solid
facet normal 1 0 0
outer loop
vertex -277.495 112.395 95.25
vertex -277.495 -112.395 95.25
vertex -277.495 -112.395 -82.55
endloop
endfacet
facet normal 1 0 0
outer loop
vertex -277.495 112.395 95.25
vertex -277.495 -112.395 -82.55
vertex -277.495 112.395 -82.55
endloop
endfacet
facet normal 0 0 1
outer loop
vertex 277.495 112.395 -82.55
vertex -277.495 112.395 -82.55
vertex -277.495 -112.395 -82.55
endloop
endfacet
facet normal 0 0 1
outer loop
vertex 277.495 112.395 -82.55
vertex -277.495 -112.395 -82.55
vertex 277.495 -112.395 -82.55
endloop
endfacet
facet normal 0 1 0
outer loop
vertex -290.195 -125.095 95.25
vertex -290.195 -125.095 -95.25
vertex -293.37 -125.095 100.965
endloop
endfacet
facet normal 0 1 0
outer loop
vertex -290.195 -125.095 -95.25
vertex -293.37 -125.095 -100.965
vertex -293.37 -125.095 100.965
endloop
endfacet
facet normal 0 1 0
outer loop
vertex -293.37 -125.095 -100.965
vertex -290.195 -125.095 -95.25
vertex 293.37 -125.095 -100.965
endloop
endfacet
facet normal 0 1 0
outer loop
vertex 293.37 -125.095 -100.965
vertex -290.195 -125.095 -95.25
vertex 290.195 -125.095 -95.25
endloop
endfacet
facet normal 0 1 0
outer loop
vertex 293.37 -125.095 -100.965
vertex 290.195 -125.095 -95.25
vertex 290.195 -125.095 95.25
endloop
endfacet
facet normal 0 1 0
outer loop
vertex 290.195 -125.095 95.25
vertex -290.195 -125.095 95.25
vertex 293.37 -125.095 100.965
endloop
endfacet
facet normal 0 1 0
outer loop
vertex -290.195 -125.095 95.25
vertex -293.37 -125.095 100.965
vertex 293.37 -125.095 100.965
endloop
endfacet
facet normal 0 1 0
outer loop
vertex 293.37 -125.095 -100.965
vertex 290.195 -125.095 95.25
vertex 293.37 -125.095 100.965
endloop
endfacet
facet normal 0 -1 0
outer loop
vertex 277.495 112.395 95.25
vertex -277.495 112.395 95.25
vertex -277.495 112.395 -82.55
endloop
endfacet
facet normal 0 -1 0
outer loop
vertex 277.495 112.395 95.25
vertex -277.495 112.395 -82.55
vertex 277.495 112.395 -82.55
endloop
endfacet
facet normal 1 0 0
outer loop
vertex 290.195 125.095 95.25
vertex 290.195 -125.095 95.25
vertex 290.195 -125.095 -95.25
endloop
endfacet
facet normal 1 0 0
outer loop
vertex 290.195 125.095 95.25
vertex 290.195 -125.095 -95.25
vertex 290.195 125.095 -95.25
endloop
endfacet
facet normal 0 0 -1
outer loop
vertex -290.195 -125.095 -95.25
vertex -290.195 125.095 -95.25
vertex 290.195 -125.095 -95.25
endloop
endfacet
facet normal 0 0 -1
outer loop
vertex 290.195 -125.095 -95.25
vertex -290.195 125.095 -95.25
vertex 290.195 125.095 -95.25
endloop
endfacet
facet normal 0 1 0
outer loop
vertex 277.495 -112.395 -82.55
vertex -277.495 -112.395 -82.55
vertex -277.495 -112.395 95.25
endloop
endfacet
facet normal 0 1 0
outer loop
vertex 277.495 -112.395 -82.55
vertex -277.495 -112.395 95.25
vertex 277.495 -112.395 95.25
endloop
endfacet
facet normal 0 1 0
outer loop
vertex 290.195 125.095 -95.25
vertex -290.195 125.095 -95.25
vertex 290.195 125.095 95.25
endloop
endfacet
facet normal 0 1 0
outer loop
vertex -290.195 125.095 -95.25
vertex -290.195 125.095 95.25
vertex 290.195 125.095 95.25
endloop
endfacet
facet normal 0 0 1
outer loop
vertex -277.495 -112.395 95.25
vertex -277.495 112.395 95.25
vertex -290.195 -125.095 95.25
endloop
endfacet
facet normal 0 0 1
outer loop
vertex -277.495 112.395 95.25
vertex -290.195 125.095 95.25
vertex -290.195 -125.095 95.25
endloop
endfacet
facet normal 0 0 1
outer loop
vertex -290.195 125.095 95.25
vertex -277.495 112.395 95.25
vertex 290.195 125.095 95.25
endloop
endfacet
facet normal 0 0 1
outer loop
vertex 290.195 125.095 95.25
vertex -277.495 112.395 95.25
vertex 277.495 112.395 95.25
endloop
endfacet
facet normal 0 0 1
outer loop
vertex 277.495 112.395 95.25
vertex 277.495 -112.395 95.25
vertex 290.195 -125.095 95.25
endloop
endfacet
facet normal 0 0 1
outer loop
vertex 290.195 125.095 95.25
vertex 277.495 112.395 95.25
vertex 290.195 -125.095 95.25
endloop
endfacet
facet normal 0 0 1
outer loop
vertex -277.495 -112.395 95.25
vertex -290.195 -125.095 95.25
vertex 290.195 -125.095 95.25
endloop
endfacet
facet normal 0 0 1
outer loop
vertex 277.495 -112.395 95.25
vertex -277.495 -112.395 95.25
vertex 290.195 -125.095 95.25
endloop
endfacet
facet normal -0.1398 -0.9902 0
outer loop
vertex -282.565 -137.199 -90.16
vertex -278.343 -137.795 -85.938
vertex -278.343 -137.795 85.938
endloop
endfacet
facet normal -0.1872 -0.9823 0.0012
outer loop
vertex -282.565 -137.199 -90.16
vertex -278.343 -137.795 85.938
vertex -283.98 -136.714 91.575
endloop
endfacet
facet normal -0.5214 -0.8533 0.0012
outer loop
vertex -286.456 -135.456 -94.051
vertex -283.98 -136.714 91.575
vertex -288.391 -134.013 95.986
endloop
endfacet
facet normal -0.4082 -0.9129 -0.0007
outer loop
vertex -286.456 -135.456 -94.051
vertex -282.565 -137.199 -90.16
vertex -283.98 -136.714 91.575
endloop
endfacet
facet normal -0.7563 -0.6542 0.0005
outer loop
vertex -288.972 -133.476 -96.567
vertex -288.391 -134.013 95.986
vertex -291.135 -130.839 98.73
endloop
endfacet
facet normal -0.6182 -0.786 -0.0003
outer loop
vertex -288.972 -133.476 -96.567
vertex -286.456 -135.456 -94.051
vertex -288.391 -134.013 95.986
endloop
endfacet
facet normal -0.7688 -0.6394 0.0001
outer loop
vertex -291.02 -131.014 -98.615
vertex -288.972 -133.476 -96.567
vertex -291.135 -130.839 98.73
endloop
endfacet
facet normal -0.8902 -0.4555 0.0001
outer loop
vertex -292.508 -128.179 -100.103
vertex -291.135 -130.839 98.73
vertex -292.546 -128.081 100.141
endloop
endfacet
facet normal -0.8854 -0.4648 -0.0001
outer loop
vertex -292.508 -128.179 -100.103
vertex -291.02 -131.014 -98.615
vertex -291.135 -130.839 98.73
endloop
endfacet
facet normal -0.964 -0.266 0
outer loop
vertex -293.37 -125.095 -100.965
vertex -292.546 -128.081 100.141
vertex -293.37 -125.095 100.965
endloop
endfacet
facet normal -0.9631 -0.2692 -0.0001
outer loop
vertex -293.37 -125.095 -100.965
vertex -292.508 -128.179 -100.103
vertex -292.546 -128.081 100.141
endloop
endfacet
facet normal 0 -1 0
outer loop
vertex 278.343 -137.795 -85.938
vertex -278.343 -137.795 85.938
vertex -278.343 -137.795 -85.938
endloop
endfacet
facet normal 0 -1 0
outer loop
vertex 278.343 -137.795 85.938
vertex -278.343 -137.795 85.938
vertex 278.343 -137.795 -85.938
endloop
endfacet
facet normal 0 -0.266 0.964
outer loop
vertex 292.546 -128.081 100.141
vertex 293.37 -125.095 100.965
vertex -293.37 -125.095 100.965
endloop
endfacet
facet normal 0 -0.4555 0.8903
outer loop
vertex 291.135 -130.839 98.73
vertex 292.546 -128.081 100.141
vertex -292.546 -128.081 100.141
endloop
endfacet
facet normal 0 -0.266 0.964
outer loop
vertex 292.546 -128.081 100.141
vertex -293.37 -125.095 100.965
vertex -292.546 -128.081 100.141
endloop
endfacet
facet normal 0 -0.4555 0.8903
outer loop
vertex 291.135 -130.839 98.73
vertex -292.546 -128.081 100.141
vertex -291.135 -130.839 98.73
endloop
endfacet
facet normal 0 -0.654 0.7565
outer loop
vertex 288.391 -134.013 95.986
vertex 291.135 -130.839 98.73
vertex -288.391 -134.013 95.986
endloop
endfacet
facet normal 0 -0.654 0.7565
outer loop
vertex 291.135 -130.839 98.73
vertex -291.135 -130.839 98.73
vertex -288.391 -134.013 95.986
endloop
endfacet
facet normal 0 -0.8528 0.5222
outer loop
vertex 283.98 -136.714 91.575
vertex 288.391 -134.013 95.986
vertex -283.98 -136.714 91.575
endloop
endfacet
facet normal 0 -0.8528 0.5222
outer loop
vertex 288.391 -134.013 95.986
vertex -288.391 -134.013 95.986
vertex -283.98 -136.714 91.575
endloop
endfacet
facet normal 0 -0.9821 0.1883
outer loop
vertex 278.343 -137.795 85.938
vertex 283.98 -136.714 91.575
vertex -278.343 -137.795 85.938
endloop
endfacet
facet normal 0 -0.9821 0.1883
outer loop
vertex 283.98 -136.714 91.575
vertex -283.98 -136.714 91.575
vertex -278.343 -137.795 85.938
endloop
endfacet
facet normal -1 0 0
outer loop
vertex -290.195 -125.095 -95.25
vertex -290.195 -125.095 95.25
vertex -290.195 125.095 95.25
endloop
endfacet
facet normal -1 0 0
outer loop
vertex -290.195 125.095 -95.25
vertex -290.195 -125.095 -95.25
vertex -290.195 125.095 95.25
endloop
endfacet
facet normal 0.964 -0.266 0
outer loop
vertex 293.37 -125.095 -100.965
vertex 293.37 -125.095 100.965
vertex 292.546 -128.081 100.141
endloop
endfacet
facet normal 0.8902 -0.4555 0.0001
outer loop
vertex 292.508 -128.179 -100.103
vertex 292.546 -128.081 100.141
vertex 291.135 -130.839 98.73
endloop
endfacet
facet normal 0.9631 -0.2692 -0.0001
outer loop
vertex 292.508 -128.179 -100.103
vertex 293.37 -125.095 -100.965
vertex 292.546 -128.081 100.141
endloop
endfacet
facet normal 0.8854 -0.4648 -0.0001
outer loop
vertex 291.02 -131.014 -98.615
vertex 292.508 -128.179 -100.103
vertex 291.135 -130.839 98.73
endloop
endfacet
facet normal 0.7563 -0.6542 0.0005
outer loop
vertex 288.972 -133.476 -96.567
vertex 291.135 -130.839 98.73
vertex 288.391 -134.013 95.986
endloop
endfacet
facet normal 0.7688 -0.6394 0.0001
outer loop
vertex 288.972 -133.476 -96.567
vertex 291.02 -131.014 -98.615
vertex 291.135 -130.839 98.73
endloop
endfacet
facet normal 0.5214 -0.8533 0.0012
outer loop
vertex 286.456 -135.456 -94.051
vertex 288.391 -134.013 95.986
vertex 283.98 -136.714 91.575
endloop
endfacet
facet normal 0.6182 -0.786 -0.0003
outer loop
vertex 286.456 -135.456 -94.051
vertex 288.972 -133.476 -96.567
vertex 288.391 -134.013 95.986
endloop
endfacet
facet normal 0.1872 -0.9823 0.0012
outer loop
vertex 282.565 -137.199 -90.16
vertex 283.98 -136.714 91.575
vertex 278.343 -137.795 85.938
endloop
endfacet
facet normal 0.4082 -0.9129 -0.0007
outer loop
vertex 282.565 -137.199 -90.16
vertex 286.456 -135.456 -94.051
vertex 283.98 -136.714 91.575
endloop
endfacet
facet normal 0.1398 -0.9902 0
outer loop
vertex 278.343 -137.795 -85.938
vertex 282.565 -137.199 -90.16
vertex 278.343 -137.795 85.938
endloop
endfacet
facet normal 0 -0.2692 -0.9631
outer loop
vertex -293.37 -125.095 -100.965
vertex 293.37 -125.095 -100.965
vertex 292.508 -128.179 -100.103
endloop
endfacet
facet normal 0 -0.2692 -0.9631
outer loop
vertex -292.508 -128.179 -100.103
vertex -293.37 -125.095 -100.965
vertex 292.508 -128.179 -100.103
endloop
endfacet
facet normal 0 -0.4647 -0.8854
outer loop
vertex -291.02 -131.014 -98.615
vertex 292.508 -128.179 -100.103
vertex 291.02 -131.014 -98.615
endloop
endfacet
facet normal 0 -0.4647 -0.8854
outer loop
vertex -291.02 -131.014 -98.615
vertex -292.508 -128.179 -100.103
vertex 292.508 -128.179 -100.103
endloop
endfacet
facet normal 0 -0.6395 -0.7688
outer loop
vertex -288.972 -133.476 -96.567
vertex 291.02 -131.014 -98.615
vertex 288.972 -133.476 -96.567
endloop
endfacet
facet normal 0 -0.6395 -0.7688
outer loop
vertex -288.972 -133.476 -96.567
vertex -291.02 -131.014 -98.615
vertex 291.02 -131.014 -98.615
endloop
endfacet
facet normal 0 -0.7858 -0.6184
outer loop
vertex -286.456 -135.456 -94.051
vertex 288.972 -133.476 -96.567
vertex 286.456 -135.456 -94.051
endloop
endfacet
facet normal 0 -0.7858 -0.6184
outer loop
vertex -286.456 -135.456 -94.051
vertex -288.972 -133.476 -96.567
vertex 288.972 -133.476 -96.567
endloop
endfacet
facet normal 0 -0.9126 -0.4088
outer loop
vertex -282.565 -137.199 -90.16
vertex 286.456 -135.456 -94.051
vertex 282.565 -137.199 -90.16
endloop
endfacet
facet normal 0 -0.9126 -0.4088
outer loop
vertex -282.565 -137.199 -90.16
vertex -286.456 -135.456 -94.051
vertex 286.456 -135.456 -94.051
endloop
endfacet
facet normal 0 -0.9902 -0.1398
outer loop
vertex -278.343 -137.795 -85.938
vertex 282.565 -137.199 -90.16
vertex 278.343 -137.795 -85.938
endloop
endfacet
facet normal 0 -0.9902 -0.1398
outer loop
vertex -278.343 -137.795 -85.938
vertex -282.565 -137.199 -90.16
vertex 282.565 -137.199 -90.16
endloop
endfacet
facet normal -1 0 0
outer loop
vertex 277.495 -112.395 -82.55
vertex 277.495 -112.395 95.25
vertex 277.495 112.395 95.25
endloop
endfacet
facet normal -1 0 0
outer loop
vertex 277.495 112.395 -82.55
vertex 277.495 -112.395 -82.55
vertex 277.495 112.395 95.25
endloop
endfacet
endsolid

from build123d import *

# Parameters (mm, degrees)
F0_W        = 580.39
F0_H        = 250.19
F1_DEPTH    = 95.25
F2_T        = -12.7
F3_W        = 542.29
F3_H        = 171.45
F4_DEPTH    = 25.4
F5_W        = 586.74
F5_H        = 201.93
F6_DEPTH    = 12.7
F7_T1_DEPTH = 661.8742132454
F7_T3_DEPTH = 277.0642132454
F8_DEPTH    = 171.45


# Not quite as in the source:
# - a fillet or chamfer that OpenCascade refuses, or shapes differently, is made with other operations: its cross-section is extruded or revolved along the edge and cut away or added


with BuildPart() as f1:
    # F0 (on Top) → F1 (new body, symmetric)
    with BuildSketch(Plane.XY):
        Rectangle(F0_W, F0_H)
    extrude(amount=F1_DEPTH, both=True)

    # F2
    f2_openings = [f1.faces().sort_by_distance(p)[0] for p in [
        (0, 0, 95.25),
    ]]
    offset(amount=F2_T, openings=f2_openings)

    # F3 (on face) → F4 (cut)
    with BuildSketch(Plane.XZ.offset(125.095)):
        with Locations((0, 9.525)):
            Rectangle(F3_W, F3_H)
    extrude(amount=-F4_DEPTH, mode=Mode.SUBTRACT)

    # F5 (on face) → F6 (join)
    with BuildSketch(Plane.XZ.offset(125.095)):
        Rectangle(F5_W, F5_H)
        Polygon((-290.195, -95.25), (-290.195, 95.25), (-271.145, 95.25), (-271.145, -76.2), (271.145, -76.2), (271.145, 95.25), (290.195, 95.25), (290.195, -95.25), align=None, mode=Mode.SUBTRACT)
        Polygon((-271.145, 95.25), (-290.195, 95.25), (-290.195, -95.25), (290.195, -95.25), (290.195, 95.25), (271.145, 95.25), (271.145, -76.2), (-271.145, -76.2), align=None)
    extrude(amount=F6_DEPTH)

    # F7: fillet of radius 15.24 on 4 edges, made by hand

    # F7_s2 → F7_t1 (cut)
    with BuildSketch(Plane.YZ.offset(-330.9371066227)):
        with BuildLine():
            ThreePointArc((-125.095, 100.965), (-134.1947422652, 95.7755350503), (-137.795, 85.9381573509))
            Line((-137.795, 85.9381573509), (-137.795, 100.965))
            Line((-137.795, 100.965), (-125.095, 100.965))
        make_face()
        with BuildLine():
            ThreePointArc((-125.095, -100.965), (-134.1947422652, -95.7755350503), (-137.795, -85.9381573509))
            Line((-137.795, -85.9381573509), (-137.795, -100.965))
            Line((-137.795, -100.965), (-125.095, -100.965))
        make_face()
    extrude(amount=F7_T1_DEPTH, mode=Mode.SUBTRACT)

    # F7_s4 → F7_t3 (cut)
    with BuildSketch(Plane.XY.offset(-138.5321066227)):
        with BuildLine():
            ThreePointArc((-278.3431573509, -137.795), (-288.1805350503, -134.1947422652), (-293.37, -125.095))
            Line((-293.37, -125.095), (-293.37, -137.795))
            Line((-293.37, -137.795), (-278.3431573509, -137.795))
        make_face()
        with BuildLine():
            ThreePointArc((293.37, -125.095), (288.1805350503, -134.1947422652), (278.3431573509, -137.795))
            Line((278.3431573509, -137.795), (293.37, -137.795))
            Line((293.37, -137.795), (293.37, -125.095))
        make_face()
    extrude(amount=F7_T3_DEPTH, mode=Mode.SUBTRACT)

    # F8 (add): a face of the model
    f8_faces = [f1.faces().sort_by_distance(p)[0] for p in [
        (0, -118.745, -76.2),
    ]]
    extrude(f8_faces, amount=F8_DEPTH)


solid = f1.part
